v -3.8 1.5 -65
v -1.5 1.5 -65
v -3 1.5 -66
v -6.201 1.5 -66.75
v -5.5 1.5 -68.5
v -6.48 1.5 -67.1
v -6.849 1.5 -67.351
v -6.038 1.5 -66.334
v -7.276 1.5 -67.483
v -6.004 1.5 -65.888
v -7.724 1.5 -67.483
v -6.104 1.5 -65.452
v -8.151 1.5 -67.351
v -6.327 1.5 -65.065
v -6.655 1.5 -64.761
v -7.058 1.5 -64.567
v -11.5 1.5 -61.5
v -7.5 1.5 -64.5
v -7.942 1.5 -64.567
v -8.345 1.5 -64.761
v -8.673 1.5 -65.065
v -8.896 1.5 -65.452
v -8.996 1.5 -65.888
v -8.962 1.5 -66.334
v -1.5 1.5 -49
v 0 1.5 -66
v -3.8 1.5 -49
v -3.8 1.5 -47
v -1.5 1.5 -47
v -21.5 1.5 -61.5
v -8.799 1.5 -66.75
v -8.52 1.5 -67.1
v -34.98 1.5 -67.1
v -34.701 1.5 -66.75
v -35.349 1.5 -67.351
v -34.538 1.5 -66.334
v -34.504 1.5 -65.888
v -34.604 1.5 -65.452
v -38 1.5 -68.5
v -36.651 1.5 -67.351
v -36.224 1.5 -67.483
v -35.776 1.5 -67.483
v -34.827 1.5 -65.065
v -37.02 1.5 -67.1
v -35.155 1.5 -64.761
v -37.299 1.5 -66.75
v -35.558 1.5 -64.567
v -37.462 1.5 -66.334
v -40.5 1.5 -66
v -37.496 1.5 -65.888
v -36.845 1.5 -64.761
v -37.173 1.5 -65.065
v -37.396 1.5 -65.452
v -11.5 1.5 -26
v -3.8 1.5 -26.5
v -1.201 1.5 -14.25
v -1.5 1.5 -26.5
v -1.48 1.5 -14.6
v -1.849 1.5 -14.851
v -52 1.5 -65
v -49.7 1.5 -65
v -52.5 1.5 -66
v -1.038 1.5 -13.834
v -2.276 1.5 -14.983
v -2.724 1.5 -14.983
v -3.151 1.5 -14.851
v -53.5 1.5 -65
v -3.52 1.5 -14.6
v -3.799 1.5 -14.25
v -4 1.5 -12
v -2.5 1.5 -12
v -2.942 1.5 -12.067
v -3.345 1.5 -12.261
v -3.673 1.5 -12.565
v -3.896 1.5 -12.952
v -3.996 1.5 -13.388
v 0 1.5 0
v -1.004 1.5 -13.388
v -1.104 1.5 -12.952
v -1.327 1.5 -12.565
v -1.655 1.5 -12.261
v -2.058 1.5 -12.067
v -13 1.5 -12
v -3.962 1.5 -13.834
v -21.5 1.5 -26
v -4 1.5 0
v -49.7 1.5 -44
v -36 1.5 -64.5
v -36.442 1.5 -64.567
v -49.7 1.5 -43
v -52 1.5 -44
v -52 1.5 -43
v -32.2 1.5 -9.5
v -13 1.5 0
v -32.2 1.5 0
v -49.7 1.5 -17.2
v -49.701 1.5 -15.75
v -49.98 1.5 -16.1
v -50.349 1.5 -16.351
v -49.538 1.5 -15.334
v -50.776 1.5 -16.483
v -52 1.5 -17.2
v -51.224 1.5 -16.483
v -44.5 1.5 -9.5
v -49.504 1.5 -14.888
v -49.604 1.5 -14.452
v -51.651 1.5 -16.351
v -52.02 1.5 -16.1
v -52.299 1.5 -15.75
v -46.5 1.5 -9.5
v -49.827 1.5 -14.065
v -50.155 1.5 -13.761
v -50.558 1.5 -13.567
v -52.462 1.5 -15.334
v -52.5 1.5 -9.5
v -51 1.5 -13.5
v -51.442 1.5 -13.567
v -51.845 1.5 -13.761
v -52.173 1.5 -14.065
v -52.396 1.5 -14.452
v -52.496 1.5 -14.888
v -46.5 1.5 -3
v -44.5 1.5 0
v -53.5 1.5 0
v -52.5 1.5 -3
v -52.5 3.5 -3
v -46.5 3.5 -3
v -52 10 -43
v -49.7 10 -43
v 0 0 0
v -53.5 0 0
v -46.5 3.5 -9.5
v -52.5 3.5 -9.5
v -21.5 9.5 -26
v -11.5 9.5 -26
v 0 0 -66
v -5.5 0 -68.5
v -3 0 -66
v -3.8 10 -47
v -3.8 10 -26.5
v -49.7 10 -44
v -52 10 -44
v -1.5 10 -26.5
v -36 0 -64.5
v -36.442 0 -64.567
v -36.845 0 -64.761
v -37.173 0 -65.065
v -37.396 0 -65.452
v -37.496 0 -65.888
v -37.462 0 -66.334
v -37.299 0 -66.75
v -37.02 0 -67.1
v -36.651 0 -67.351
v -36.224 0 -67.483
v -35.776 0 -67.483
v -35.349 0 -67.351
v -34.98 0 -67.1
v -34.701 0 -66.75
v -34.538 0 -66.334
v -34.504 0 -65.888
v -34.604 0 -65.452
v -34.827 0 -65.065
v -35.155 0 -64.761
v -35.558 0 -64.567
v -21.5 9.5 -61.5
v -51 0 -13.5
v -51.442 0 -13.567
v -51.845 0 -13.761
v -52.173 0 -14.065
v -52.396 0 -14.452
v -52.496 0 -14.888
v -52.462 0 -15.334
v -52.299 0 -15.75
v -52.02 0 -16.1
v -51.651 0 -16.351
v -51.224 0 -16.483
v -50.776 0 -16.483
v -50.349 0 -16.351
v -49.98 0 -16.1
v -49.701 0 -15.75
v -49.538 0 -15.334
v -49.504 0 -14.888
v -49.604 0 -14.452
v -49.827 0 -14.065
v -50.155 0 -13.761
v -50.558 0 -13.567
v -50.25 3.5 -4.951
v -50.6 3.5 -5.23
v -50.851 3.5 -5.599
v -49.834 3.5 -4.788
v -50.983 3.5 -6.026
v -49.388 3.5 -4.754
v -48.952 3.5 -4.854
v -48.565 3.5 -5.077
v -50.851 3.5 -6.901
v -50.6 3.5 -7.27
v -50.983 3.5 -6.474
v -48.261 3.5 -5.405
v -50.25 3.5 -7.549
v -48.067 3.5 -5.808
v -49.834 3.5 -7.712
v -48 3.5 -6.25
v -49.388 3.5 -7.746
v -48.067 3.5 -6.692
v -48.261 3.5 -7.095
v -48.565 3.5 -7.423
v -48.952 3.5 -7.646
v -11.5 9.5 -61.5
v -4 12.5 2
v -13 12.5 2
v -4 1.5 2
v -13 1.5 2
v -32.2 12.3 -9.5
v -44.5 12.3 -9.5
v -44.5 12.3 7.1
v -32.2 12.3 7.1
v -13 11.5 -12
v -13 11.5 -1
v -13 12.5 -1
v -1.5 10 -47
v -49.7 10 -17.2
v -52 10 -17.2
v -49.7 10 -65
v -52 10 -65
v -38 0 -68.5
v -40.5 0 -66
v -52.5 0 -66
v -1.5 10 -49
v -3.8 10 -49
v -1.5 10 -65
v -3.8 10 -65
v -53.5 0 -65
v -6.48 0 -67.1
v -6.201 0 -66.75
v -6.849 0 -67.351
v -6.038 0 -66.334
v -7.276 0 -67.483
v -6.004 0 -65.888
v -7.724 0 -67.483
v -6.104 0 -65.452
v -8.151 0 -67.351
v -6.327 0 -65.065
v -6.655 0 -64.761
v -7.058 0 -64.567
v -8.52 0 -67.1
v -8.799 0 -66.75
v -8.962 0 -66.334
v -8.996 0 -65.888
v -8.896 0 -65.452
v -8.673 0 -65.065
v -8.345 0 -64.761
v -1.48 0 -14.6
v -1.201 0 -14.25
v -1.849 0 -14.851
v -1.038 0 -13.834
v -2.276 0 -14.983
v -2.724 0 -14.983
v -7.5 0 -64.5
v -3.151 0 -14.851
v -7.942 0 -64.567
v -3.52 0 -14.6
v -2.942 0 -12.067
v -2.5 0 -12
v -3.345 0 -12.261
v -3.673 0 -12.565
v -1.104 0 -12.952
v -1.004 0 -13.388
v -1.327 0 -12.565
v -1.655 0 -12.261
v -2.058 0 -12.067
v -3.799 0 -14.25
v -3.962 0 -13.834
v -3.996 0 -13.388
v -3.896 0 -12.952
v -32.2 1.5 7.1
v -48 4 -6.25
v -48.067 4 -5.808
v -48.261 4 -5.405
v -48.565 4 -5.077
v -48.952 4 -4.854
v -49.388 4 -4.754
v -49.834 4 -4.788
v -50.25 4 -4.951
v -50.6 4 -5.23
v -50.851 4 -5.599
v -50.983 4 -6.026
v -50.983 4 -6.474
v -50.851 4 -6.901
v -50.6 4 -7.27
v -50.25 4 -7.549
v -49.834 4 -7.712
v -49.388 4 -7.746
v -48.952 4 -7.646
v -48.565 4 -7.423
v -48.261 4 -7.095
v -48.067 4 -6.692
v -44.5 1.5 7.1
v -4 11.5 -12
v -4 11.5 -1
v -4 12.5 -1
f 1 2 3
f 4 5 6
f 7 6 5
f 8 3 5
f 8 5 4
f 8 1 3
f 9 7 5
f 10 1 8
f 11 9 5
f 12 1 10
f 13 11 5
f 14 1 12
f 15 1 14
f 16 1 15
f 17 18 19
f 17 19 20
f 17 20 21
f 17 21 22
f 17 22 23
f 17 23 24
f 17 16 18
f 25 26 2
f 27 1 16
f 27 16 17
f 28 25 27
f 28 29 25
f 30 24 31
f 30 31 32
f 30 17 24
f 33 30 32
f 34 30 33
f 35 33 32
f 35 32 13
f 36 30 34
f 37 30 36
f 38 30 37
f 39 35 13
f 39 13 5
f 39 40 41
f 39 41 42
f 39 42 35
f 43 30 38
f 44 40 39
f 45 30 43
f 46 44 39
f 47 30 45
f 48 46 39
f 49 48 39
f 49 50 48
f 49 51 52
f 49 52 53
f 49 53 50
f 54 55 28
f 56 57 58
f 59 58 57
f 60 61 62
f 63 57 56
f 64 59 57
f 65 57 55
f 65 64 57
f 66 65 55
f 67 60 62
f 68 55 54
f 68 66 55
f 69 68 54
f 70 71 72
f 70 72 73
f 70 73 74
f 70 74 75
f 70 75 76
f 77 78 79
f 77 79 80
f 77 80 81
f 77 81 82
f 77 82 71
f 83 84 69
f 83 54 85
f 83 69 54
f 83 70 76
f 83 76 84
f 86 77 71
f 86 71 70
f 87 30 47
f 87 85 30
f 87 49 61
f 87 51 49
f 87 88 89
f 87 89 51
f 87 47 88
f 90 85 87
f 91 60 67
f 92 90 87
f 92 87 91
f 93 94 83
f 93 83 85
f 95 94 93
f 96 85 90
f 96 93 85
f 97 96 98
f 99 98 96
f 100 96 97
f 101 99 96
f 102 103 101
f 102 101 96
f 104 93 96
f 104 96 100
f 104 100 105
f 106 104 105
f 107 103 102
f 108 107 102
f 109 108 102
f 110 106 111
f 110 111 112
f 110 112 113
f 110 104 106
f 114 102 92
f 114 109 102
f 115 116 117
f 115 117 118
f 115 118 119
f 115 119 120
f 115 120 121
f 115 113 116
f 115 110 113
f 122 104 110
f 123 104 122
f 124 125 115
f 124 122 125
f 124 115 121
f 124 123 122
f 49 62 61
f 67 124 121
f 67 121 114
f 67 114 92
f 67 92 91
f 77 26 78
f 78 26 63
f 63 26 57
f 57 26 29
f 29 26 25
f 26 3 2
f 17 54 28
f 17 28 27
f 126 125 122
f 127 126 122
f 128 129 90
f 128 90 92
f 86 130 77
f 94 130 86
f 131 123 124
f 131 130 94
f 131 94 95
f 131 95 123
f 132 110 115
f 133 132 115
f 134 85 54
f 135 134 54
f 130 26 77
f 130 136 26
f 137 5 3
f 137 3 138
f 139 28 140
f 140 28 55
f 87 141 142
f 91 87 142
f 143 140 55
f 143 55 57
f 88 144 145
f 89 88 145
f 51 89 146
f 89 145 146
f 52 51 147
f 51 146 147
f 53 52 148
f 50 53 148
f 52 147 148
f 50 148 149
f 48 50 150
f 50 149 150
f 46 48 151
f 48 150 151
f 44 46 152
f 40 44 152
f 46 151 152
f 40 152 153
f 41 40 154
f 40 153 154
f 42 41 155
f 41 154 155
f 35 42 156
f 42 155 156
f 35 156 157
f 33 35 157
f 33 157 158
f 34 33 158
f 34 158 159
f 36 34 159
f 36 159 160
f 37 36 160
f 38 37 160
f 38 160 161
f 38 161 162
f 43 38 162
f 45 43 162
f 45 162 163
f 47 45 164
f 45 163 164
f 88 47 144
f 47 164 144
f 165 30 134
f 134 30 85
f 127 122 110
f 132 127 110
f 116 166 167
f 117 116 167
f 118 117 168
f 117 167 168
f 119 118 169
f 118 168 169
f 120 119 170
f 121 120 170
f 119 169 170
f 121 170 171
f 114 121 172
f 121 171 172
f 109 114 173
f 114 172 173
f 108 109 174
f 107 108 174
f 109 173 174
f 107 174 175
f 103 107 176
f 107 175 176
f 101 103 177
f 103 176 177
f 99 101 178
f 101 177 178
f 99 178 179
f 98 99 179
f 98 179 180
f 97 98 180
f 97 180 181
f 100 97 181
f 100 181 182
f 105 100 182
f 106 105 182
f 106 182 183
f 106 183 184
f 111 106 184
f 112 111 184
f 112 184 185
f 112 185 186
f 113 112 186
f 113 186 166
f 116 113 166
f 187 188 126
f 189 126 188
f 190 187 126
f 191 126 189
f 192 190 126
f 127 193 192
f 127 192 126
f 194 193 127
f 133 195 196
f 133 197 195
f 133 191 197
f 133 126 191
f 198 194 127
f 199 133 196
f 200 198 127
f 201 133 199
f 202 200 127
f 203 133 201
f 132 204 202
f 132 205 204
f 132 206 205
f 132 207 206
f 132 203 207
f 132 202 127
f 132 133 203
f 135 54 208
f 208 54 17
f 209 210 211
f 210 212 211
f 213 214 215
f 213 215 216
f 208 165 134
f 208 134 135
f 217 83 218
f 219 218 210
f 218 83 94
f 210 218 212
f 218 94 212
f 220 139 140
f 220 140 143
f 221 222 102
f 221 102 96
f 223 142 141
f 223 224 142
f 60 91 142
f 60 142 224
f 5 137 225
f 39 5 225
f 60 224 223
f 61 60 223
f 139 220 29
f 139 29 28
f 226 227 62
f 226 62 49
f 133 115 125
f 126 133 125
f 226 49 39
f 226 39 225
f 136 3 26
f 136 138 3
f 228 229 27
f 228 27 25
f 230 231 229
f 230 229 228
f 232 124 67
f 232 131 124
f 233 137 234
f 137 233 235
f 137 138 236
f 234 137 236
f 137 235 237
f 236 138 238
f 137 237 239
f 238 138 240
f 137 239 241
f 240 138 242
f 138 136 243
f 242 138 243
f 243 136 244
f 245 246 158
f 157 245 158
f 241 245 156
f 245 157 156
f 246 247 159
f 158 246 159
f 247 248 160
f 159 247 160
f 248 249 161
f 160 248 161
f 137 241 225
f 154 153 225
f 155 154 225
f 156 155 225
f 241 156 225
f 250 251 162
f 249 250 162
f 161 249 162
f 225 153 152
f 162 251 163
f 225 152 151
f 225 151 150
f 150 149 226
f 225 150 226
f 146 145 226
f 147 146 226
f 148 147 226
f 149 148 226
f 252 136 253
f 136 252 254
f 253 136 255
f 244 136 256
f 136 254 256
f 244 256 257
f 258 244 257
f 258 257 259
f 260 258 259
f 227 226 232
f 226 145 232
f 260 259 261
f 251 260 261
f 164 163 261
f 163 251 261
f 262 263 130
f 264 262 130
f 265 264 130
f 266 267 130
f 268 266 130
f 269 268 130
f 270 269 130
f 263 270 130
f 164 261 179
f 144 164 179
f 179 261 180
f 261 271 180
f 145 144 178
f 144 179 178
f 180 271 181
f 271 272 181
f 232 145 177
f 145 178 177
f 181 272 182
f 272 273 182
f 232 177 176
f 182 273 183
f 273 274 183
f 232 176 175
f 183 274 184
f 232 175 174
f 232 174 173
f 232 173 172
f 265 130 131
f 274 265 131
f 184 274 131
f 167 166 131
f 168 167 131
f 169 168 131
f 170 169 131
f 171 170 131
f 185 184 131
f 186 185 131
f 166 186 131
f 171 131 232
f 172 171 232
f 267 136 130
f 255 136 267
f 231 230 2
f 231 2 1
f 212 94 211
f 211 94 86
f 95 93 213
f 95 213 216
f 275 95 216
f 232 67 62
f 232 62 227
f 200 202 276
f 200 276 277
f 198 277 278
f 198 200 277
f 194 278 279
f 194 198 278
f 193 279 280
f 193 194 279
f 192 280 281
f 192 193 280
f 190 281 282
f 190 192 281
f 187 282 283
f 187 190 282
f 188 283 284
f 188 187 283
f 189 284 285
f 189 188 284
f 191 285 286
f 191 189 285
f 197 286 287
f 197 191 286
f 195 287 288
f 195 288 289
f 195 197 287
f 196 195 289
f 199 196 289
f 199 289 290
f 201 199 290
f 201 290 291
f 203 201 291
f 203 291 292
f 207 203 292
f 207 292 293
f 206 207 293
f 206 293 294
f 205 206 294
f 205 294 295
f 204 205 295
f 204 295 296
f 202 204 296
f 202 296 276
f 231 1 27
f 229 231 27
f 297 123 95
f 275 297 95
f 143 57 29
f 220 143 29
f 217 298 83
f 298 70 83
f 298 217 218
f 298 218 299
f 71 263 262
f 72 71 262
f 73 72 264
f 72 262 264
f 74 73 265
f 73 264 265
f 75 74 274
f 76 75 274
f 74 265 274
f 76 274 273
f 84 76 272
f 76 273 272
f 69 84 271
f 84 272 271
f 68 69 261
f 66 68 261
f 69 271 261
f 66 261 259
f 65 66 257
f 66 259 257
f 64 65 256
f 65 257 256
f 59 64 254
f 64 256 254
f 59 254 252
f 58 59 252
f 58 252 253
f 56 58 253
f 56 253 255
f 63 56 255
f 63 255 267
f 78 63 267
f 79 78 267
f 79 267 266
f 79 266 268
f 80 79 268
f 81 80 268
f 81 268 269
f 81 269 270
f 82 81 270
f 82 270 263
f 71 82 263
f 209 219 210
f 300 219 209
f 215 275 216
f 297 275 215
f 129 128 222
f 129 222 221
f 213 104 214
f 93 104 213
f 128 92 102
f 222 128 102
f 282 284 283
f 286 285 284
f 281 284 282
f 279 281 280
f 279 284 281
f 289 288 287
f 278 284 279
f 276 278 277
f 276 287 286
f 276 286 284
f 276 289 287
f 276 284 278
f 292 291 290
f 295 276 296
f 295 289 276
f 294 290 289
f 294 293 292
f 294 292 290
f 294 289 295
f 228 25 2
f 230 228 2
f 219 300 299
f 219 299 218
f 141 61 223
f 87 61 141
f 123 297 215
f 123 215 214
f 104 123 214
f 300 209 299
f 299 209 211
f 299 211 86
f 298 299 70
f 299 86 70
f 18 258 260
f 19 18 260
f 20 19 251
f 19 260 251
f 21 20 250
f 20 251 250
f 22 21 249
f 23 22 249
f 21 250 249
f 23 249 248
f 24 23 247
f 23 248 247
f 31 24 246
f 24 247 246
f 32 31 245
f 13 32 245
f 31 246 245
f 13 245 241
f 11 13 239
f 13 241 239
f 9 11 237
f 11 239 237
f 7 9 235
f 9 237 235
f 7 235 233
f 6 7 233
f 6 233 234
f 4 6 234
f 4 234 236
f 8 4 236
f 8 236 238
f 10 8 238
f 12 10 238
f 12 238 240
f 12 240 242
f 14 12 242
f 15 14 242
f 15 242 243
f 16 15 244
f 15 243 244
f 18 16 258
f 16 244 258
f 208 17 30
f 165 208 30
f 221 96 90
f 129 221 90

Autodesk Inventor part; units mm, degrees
ref_plane "YZ Plane" through (0, 0, 0) normal (1, 0, 0) x (0, 1, 0)
ref_plane "XZ Plane" through (0, 0, 0) normal (0, 1, 0) x (-1, 0, 0)
ref_plane "XY Plane" through (0, 0, 0) normal (0, 0, 1) x (1, 0, 0)
sketch "Эскиз1" plane through (0, 0, 0) normal (0, 1, 0) x (-1, 0, 0)
  line L0 (0, 0) -> (53.5, 0)
  line L1 (53.5, 0) -> (53.5, -66)
  line L2 (53.5, -66) -> (0, -66)
  line L3 (0, -66) -> (0, 0)
  line L4 (53.5, -66) -> (40.5, -66)
  line L5 (40.5, -66) -> (3, -66)
  line L6 (3, -66) -> (3, -68.5)
  line L7 (3, -68.5) -> (40.5, -68.5)
  line L8 (40.5, -68.5) -> (40.5, -66)
  point P0 (3, -66)
  dimension "d0" = 53.5
  dimension "d1" = 66
  dimension "d4" = 13
  dimension "d5" = 37.5
  dimension "d6" = 2.5
extrude "Выдавливание1" add sketch "Эскиз1" along normal blind 1.5
sketch "Эскиз2" plane through (0, 1.5, 0) normal (0, 1, 0) x (1, 0, 0)
  line L0 (-40.5, 66) -> (-53.5, 66) projected
  line L1 (-53.5, 66) -> (-52, 66)
  line L2 (-52, 66) -> (-52, 65)
  line L3 (-52, 65) -> (-49.7, 65)
  line L4 (-49.7, 65) -> (-49.7, 44)
  line L5 (-49.7, 44) -> (-52, 44)
  line L6 (-52, 44) -> (-52, 65)
  line L7 (-49.7, 44) -> (-49.7, 43)
  line L8 (-49.7, 43) -> (-52, 43)
  line L9 (-52, 43) -> (-52, 17.2)
  line L10 (-52, 17.2) -> (-49.7, 17.2)
  line L11 (-49.7, 17.2) -> (-49.7, 43)
  point P0 (0, 0)
  dimension "d15" = 1.5
  dimension "d16" = 1
  dimension "d17" = 2.3
  dimension "d18" = 21
  dimension "d19" = 1
  dimension "d20" = 25.8
extrude "Выдавливание2" add sketch "Эскиз2" along normal blind 8.5
sketch "Эскиз3" plane through (0, 1.5, 0) normal (0, 1, 0) x (1, 0, 0)
  line L0 (-53.5, 66) -> (-53.5, 0) projected
  line L1 (-53.5, 0) -> (-53.5, 3)
  line L2 (-53.5, 3) -> (-52.5, 3)
  line L3 (-52.5, 3) -> (-46.5, 3)
  line L4 (-46.5, 3) -> (-46.5, 9.5)
  line L5 (-46.5, 9.5) -> (-52.5, 9.5)
  line L6 (-52.5, 9.5) -> (-52.5, 3)
  point P0 (0, 0)
  dimension "d23" = 3
  dimension "d24" = 1
  dimension "d25" = 6
  dimension "d26" = 6.5
extrude "Выдавливание3" add sketch "Эскиз3" along normal blind 2
sketch "Эскиз4" plane through (0, 3.5, 0) normal (0, 1, 0) x (1, 0, 0)
  line L0 (-52.5, 3) -> (-52.5, 9.5) projected
  line L1 (-52.5, 6.25) -> (-46.5, 6.25)
  line L2 (-46.5, 3) -> (-46.5, 9.5) projected
  circle A0 centre (-49.5, 6.25) radius 1.5
  point P0 (0, 0)
  dimension "d29" = 3
extrude "Выдавливание4" add sketch "Эскиз4" along normal blind 0.5
sketch "Эскиз5" plane through (0, 1.5, 0) normal (0, 1, 0) x (1, 0, 0)
  line L0 (-46.5, 9.5) -> (-52.5, 9.5) projected
  line L1 (-46.5, 9.5) -> (-44.5, 9.5)
  line L2 (-44.5, 9.5) -> (-32.2, 9.5)
  line L3 (-32.2, 9.5) -> (-32.2, -7.1)
  line L4 (-32.2, -7.1) -> (-44.5, -7.1)
  line L5 (-44.5, -7.1) -> (-44.5, 9.5)
  point P0 (0, 0)
  dimension "d32" = 2
  dimension "d33" = 12.3
  dimension "d34" = 16.6
extrude "Выдавливание5" add sketch "Эскиз5" along normal blind 10.8
sketch "Эскиз6" plane through (0, 1.5, 0) normal (0, 1, 0) x (1, 0, 0)
  line L0 (-32.2, 0) -> (0, 0) projected
  line L1 (0, 0) -> (-4, 0)
  line L2 (-4, 0) -> (-4, 12)
  line L3 (-4, 12) -> (-13, 12)
  line L4 (-13, 12) -> (-13, -2)
  line L5 (-13, -2) -> (-4, -2)
  line L6 (-4, -2) -> (-4, 12)
  dimension "d37" = 4
  dimension "d38" = 12
  dimension "d39" = 9
  dimension "d40" = 14
extrude "Выдавливание6" add sketch "Эскиз6" along normal blind 11
sketch "Эскиз7" plane through (0, 12.5, 0) normal (0, 1, 0) x (1, 0, 0)
  line L0 (-13, 12) -> (-13, -2) projected
  line L1 (-13, 12) -> (-4, 12)
  line L2 (-4, 12) -> (-4, 1)
  line L3 (-4, 1) -> (-13, 1)
  line L4 (-13, 1) -> (-13, 12)
  point P0 (0, 0)
  dimension "d43" = 11
extrude "Выдавливание7" cut sketch "Эскиз7" against normal blind 1
sketch "Эскиз8" plane through (0, 1.5, 0) normal (0, 1, 0) x (1, 0, 0)
  line L0 (0, 0) -> (0, 66) projected
  line L1 (0, 66) -> (0, 65)
  line L2 (0, 65) -> (-1.5, 65)
  line L3 (-1.5, 65) -> (-3.8, 65)
  line L4 (-3.8, 65) -> (-3.8, 49)
  line L5 (-3.8, 49) -> (-1.5, 49)
  line L6 (-1.5, 49) -> (-1.5, 65)
  line L7 (-1.5, 49) -> (-1.5, 47)
  line L8 (-1.5, 47) -> (-3.8, 47)
  line L9 (-3.8, 47) -> (-3.8, 26.5)
  line L10 (-3.8, 26.5) -> (-1.5, 26.5)
  line L11 (-1.5, 26.5) -> (-1.5, 47)
  dimension "d47" = 1
  dimension "d48" = 1.5
  dimension "d49" = 2.3
  dimension "d50" = 16
  dimension "d51" = 2
  dimension "d52" = 20.5
extrude "Выдавливание8" add sketch "Эскиз8" along normal blind 8.5
sketch "Эскиз9" plane through (0, 1.5, 0) normal (0, 1, 0) x (1, 0, 0)
  line L0 (0, 0) -> (0, 66) projected
  line L1 (0, 66) -> (-21.5, 66)
  line L2 (-21.5, 66) -> (-21.5, 26)
  line L3 (-21.5, 26) -> (-11.5, 26)
  line L4 (-11.5, 26) -> (-11.5, 61.5)
  line L5 (-11.5, 61.5) -> (-21.5, 61.5)
  line L6 (-21.5, 61.5) -> (-21.5, 26)
  dimension "d55" = 21.5
  dimension "d56" = 40
  dimension "d57" = 10
  dimension "d58" = 35.5
extrude "Выдавливание9" add sketch "Эскиз9" along normal blind 8
sketch "Эскиз10" plane through (0, 1.5, 0) normal (0, 1, 0) x (1, 0, 0)
  line L0 (-40.5, 68.5) -> (-40.5, 66) projected
  line L1 (-40.5, 68.5) -> (-36, 68.5)
  line L2 (-3, 68.5) -> (-40.5, 68.5) projected
  line L3 (-36, 68.5) -> (-36, 66)
  line L4 (-3, 68.5) -> (-7.5, 68.5)
  line L5 (-7.5, 68.5) -> (-7.5, 66)
  line L6 (0, 0) -> (0, 13.5)
  line L7 (0, 0) -> (0, 66) projected
  line L8 (0, 13.5) -> (-2.5, 13.5)
  line L9 (-53.5, 66) -> (-53.5, 0) projected
  line L10 (-53.5, 0) -> (-53.5, 15)
  line L11 (-53.5, 15) -> (-51, 15)
  dimension "d67" = 4.5
  dimension "d68" = 2.5
  dimension "d69" = 4.5
  dimension "d70" = 2.5
  dimension "d71" = 13.5
  dimension "d72" = 2.5
  dimension "d73" = 15
  dimension "d74" = 2.5
hole "Отверстие1" at (-51, 1.5, -15) at (-2.5, 1.5, -13.5) at (-7.5, 1.5, -66) at (-36, 1.5, -66) direction (0, -1, 0) diameter 3 end through all
chamfer "Фаска3" distance 2.5 angle 45 2 edges at (-40.5, 0.75, -68.5) (-3, 0.75, -68.5)
chamfer "Фаска4" distance 1 angle 45 1 edges at (-53.5, 0.75, -66)
properties part number "Arduino UNO"
